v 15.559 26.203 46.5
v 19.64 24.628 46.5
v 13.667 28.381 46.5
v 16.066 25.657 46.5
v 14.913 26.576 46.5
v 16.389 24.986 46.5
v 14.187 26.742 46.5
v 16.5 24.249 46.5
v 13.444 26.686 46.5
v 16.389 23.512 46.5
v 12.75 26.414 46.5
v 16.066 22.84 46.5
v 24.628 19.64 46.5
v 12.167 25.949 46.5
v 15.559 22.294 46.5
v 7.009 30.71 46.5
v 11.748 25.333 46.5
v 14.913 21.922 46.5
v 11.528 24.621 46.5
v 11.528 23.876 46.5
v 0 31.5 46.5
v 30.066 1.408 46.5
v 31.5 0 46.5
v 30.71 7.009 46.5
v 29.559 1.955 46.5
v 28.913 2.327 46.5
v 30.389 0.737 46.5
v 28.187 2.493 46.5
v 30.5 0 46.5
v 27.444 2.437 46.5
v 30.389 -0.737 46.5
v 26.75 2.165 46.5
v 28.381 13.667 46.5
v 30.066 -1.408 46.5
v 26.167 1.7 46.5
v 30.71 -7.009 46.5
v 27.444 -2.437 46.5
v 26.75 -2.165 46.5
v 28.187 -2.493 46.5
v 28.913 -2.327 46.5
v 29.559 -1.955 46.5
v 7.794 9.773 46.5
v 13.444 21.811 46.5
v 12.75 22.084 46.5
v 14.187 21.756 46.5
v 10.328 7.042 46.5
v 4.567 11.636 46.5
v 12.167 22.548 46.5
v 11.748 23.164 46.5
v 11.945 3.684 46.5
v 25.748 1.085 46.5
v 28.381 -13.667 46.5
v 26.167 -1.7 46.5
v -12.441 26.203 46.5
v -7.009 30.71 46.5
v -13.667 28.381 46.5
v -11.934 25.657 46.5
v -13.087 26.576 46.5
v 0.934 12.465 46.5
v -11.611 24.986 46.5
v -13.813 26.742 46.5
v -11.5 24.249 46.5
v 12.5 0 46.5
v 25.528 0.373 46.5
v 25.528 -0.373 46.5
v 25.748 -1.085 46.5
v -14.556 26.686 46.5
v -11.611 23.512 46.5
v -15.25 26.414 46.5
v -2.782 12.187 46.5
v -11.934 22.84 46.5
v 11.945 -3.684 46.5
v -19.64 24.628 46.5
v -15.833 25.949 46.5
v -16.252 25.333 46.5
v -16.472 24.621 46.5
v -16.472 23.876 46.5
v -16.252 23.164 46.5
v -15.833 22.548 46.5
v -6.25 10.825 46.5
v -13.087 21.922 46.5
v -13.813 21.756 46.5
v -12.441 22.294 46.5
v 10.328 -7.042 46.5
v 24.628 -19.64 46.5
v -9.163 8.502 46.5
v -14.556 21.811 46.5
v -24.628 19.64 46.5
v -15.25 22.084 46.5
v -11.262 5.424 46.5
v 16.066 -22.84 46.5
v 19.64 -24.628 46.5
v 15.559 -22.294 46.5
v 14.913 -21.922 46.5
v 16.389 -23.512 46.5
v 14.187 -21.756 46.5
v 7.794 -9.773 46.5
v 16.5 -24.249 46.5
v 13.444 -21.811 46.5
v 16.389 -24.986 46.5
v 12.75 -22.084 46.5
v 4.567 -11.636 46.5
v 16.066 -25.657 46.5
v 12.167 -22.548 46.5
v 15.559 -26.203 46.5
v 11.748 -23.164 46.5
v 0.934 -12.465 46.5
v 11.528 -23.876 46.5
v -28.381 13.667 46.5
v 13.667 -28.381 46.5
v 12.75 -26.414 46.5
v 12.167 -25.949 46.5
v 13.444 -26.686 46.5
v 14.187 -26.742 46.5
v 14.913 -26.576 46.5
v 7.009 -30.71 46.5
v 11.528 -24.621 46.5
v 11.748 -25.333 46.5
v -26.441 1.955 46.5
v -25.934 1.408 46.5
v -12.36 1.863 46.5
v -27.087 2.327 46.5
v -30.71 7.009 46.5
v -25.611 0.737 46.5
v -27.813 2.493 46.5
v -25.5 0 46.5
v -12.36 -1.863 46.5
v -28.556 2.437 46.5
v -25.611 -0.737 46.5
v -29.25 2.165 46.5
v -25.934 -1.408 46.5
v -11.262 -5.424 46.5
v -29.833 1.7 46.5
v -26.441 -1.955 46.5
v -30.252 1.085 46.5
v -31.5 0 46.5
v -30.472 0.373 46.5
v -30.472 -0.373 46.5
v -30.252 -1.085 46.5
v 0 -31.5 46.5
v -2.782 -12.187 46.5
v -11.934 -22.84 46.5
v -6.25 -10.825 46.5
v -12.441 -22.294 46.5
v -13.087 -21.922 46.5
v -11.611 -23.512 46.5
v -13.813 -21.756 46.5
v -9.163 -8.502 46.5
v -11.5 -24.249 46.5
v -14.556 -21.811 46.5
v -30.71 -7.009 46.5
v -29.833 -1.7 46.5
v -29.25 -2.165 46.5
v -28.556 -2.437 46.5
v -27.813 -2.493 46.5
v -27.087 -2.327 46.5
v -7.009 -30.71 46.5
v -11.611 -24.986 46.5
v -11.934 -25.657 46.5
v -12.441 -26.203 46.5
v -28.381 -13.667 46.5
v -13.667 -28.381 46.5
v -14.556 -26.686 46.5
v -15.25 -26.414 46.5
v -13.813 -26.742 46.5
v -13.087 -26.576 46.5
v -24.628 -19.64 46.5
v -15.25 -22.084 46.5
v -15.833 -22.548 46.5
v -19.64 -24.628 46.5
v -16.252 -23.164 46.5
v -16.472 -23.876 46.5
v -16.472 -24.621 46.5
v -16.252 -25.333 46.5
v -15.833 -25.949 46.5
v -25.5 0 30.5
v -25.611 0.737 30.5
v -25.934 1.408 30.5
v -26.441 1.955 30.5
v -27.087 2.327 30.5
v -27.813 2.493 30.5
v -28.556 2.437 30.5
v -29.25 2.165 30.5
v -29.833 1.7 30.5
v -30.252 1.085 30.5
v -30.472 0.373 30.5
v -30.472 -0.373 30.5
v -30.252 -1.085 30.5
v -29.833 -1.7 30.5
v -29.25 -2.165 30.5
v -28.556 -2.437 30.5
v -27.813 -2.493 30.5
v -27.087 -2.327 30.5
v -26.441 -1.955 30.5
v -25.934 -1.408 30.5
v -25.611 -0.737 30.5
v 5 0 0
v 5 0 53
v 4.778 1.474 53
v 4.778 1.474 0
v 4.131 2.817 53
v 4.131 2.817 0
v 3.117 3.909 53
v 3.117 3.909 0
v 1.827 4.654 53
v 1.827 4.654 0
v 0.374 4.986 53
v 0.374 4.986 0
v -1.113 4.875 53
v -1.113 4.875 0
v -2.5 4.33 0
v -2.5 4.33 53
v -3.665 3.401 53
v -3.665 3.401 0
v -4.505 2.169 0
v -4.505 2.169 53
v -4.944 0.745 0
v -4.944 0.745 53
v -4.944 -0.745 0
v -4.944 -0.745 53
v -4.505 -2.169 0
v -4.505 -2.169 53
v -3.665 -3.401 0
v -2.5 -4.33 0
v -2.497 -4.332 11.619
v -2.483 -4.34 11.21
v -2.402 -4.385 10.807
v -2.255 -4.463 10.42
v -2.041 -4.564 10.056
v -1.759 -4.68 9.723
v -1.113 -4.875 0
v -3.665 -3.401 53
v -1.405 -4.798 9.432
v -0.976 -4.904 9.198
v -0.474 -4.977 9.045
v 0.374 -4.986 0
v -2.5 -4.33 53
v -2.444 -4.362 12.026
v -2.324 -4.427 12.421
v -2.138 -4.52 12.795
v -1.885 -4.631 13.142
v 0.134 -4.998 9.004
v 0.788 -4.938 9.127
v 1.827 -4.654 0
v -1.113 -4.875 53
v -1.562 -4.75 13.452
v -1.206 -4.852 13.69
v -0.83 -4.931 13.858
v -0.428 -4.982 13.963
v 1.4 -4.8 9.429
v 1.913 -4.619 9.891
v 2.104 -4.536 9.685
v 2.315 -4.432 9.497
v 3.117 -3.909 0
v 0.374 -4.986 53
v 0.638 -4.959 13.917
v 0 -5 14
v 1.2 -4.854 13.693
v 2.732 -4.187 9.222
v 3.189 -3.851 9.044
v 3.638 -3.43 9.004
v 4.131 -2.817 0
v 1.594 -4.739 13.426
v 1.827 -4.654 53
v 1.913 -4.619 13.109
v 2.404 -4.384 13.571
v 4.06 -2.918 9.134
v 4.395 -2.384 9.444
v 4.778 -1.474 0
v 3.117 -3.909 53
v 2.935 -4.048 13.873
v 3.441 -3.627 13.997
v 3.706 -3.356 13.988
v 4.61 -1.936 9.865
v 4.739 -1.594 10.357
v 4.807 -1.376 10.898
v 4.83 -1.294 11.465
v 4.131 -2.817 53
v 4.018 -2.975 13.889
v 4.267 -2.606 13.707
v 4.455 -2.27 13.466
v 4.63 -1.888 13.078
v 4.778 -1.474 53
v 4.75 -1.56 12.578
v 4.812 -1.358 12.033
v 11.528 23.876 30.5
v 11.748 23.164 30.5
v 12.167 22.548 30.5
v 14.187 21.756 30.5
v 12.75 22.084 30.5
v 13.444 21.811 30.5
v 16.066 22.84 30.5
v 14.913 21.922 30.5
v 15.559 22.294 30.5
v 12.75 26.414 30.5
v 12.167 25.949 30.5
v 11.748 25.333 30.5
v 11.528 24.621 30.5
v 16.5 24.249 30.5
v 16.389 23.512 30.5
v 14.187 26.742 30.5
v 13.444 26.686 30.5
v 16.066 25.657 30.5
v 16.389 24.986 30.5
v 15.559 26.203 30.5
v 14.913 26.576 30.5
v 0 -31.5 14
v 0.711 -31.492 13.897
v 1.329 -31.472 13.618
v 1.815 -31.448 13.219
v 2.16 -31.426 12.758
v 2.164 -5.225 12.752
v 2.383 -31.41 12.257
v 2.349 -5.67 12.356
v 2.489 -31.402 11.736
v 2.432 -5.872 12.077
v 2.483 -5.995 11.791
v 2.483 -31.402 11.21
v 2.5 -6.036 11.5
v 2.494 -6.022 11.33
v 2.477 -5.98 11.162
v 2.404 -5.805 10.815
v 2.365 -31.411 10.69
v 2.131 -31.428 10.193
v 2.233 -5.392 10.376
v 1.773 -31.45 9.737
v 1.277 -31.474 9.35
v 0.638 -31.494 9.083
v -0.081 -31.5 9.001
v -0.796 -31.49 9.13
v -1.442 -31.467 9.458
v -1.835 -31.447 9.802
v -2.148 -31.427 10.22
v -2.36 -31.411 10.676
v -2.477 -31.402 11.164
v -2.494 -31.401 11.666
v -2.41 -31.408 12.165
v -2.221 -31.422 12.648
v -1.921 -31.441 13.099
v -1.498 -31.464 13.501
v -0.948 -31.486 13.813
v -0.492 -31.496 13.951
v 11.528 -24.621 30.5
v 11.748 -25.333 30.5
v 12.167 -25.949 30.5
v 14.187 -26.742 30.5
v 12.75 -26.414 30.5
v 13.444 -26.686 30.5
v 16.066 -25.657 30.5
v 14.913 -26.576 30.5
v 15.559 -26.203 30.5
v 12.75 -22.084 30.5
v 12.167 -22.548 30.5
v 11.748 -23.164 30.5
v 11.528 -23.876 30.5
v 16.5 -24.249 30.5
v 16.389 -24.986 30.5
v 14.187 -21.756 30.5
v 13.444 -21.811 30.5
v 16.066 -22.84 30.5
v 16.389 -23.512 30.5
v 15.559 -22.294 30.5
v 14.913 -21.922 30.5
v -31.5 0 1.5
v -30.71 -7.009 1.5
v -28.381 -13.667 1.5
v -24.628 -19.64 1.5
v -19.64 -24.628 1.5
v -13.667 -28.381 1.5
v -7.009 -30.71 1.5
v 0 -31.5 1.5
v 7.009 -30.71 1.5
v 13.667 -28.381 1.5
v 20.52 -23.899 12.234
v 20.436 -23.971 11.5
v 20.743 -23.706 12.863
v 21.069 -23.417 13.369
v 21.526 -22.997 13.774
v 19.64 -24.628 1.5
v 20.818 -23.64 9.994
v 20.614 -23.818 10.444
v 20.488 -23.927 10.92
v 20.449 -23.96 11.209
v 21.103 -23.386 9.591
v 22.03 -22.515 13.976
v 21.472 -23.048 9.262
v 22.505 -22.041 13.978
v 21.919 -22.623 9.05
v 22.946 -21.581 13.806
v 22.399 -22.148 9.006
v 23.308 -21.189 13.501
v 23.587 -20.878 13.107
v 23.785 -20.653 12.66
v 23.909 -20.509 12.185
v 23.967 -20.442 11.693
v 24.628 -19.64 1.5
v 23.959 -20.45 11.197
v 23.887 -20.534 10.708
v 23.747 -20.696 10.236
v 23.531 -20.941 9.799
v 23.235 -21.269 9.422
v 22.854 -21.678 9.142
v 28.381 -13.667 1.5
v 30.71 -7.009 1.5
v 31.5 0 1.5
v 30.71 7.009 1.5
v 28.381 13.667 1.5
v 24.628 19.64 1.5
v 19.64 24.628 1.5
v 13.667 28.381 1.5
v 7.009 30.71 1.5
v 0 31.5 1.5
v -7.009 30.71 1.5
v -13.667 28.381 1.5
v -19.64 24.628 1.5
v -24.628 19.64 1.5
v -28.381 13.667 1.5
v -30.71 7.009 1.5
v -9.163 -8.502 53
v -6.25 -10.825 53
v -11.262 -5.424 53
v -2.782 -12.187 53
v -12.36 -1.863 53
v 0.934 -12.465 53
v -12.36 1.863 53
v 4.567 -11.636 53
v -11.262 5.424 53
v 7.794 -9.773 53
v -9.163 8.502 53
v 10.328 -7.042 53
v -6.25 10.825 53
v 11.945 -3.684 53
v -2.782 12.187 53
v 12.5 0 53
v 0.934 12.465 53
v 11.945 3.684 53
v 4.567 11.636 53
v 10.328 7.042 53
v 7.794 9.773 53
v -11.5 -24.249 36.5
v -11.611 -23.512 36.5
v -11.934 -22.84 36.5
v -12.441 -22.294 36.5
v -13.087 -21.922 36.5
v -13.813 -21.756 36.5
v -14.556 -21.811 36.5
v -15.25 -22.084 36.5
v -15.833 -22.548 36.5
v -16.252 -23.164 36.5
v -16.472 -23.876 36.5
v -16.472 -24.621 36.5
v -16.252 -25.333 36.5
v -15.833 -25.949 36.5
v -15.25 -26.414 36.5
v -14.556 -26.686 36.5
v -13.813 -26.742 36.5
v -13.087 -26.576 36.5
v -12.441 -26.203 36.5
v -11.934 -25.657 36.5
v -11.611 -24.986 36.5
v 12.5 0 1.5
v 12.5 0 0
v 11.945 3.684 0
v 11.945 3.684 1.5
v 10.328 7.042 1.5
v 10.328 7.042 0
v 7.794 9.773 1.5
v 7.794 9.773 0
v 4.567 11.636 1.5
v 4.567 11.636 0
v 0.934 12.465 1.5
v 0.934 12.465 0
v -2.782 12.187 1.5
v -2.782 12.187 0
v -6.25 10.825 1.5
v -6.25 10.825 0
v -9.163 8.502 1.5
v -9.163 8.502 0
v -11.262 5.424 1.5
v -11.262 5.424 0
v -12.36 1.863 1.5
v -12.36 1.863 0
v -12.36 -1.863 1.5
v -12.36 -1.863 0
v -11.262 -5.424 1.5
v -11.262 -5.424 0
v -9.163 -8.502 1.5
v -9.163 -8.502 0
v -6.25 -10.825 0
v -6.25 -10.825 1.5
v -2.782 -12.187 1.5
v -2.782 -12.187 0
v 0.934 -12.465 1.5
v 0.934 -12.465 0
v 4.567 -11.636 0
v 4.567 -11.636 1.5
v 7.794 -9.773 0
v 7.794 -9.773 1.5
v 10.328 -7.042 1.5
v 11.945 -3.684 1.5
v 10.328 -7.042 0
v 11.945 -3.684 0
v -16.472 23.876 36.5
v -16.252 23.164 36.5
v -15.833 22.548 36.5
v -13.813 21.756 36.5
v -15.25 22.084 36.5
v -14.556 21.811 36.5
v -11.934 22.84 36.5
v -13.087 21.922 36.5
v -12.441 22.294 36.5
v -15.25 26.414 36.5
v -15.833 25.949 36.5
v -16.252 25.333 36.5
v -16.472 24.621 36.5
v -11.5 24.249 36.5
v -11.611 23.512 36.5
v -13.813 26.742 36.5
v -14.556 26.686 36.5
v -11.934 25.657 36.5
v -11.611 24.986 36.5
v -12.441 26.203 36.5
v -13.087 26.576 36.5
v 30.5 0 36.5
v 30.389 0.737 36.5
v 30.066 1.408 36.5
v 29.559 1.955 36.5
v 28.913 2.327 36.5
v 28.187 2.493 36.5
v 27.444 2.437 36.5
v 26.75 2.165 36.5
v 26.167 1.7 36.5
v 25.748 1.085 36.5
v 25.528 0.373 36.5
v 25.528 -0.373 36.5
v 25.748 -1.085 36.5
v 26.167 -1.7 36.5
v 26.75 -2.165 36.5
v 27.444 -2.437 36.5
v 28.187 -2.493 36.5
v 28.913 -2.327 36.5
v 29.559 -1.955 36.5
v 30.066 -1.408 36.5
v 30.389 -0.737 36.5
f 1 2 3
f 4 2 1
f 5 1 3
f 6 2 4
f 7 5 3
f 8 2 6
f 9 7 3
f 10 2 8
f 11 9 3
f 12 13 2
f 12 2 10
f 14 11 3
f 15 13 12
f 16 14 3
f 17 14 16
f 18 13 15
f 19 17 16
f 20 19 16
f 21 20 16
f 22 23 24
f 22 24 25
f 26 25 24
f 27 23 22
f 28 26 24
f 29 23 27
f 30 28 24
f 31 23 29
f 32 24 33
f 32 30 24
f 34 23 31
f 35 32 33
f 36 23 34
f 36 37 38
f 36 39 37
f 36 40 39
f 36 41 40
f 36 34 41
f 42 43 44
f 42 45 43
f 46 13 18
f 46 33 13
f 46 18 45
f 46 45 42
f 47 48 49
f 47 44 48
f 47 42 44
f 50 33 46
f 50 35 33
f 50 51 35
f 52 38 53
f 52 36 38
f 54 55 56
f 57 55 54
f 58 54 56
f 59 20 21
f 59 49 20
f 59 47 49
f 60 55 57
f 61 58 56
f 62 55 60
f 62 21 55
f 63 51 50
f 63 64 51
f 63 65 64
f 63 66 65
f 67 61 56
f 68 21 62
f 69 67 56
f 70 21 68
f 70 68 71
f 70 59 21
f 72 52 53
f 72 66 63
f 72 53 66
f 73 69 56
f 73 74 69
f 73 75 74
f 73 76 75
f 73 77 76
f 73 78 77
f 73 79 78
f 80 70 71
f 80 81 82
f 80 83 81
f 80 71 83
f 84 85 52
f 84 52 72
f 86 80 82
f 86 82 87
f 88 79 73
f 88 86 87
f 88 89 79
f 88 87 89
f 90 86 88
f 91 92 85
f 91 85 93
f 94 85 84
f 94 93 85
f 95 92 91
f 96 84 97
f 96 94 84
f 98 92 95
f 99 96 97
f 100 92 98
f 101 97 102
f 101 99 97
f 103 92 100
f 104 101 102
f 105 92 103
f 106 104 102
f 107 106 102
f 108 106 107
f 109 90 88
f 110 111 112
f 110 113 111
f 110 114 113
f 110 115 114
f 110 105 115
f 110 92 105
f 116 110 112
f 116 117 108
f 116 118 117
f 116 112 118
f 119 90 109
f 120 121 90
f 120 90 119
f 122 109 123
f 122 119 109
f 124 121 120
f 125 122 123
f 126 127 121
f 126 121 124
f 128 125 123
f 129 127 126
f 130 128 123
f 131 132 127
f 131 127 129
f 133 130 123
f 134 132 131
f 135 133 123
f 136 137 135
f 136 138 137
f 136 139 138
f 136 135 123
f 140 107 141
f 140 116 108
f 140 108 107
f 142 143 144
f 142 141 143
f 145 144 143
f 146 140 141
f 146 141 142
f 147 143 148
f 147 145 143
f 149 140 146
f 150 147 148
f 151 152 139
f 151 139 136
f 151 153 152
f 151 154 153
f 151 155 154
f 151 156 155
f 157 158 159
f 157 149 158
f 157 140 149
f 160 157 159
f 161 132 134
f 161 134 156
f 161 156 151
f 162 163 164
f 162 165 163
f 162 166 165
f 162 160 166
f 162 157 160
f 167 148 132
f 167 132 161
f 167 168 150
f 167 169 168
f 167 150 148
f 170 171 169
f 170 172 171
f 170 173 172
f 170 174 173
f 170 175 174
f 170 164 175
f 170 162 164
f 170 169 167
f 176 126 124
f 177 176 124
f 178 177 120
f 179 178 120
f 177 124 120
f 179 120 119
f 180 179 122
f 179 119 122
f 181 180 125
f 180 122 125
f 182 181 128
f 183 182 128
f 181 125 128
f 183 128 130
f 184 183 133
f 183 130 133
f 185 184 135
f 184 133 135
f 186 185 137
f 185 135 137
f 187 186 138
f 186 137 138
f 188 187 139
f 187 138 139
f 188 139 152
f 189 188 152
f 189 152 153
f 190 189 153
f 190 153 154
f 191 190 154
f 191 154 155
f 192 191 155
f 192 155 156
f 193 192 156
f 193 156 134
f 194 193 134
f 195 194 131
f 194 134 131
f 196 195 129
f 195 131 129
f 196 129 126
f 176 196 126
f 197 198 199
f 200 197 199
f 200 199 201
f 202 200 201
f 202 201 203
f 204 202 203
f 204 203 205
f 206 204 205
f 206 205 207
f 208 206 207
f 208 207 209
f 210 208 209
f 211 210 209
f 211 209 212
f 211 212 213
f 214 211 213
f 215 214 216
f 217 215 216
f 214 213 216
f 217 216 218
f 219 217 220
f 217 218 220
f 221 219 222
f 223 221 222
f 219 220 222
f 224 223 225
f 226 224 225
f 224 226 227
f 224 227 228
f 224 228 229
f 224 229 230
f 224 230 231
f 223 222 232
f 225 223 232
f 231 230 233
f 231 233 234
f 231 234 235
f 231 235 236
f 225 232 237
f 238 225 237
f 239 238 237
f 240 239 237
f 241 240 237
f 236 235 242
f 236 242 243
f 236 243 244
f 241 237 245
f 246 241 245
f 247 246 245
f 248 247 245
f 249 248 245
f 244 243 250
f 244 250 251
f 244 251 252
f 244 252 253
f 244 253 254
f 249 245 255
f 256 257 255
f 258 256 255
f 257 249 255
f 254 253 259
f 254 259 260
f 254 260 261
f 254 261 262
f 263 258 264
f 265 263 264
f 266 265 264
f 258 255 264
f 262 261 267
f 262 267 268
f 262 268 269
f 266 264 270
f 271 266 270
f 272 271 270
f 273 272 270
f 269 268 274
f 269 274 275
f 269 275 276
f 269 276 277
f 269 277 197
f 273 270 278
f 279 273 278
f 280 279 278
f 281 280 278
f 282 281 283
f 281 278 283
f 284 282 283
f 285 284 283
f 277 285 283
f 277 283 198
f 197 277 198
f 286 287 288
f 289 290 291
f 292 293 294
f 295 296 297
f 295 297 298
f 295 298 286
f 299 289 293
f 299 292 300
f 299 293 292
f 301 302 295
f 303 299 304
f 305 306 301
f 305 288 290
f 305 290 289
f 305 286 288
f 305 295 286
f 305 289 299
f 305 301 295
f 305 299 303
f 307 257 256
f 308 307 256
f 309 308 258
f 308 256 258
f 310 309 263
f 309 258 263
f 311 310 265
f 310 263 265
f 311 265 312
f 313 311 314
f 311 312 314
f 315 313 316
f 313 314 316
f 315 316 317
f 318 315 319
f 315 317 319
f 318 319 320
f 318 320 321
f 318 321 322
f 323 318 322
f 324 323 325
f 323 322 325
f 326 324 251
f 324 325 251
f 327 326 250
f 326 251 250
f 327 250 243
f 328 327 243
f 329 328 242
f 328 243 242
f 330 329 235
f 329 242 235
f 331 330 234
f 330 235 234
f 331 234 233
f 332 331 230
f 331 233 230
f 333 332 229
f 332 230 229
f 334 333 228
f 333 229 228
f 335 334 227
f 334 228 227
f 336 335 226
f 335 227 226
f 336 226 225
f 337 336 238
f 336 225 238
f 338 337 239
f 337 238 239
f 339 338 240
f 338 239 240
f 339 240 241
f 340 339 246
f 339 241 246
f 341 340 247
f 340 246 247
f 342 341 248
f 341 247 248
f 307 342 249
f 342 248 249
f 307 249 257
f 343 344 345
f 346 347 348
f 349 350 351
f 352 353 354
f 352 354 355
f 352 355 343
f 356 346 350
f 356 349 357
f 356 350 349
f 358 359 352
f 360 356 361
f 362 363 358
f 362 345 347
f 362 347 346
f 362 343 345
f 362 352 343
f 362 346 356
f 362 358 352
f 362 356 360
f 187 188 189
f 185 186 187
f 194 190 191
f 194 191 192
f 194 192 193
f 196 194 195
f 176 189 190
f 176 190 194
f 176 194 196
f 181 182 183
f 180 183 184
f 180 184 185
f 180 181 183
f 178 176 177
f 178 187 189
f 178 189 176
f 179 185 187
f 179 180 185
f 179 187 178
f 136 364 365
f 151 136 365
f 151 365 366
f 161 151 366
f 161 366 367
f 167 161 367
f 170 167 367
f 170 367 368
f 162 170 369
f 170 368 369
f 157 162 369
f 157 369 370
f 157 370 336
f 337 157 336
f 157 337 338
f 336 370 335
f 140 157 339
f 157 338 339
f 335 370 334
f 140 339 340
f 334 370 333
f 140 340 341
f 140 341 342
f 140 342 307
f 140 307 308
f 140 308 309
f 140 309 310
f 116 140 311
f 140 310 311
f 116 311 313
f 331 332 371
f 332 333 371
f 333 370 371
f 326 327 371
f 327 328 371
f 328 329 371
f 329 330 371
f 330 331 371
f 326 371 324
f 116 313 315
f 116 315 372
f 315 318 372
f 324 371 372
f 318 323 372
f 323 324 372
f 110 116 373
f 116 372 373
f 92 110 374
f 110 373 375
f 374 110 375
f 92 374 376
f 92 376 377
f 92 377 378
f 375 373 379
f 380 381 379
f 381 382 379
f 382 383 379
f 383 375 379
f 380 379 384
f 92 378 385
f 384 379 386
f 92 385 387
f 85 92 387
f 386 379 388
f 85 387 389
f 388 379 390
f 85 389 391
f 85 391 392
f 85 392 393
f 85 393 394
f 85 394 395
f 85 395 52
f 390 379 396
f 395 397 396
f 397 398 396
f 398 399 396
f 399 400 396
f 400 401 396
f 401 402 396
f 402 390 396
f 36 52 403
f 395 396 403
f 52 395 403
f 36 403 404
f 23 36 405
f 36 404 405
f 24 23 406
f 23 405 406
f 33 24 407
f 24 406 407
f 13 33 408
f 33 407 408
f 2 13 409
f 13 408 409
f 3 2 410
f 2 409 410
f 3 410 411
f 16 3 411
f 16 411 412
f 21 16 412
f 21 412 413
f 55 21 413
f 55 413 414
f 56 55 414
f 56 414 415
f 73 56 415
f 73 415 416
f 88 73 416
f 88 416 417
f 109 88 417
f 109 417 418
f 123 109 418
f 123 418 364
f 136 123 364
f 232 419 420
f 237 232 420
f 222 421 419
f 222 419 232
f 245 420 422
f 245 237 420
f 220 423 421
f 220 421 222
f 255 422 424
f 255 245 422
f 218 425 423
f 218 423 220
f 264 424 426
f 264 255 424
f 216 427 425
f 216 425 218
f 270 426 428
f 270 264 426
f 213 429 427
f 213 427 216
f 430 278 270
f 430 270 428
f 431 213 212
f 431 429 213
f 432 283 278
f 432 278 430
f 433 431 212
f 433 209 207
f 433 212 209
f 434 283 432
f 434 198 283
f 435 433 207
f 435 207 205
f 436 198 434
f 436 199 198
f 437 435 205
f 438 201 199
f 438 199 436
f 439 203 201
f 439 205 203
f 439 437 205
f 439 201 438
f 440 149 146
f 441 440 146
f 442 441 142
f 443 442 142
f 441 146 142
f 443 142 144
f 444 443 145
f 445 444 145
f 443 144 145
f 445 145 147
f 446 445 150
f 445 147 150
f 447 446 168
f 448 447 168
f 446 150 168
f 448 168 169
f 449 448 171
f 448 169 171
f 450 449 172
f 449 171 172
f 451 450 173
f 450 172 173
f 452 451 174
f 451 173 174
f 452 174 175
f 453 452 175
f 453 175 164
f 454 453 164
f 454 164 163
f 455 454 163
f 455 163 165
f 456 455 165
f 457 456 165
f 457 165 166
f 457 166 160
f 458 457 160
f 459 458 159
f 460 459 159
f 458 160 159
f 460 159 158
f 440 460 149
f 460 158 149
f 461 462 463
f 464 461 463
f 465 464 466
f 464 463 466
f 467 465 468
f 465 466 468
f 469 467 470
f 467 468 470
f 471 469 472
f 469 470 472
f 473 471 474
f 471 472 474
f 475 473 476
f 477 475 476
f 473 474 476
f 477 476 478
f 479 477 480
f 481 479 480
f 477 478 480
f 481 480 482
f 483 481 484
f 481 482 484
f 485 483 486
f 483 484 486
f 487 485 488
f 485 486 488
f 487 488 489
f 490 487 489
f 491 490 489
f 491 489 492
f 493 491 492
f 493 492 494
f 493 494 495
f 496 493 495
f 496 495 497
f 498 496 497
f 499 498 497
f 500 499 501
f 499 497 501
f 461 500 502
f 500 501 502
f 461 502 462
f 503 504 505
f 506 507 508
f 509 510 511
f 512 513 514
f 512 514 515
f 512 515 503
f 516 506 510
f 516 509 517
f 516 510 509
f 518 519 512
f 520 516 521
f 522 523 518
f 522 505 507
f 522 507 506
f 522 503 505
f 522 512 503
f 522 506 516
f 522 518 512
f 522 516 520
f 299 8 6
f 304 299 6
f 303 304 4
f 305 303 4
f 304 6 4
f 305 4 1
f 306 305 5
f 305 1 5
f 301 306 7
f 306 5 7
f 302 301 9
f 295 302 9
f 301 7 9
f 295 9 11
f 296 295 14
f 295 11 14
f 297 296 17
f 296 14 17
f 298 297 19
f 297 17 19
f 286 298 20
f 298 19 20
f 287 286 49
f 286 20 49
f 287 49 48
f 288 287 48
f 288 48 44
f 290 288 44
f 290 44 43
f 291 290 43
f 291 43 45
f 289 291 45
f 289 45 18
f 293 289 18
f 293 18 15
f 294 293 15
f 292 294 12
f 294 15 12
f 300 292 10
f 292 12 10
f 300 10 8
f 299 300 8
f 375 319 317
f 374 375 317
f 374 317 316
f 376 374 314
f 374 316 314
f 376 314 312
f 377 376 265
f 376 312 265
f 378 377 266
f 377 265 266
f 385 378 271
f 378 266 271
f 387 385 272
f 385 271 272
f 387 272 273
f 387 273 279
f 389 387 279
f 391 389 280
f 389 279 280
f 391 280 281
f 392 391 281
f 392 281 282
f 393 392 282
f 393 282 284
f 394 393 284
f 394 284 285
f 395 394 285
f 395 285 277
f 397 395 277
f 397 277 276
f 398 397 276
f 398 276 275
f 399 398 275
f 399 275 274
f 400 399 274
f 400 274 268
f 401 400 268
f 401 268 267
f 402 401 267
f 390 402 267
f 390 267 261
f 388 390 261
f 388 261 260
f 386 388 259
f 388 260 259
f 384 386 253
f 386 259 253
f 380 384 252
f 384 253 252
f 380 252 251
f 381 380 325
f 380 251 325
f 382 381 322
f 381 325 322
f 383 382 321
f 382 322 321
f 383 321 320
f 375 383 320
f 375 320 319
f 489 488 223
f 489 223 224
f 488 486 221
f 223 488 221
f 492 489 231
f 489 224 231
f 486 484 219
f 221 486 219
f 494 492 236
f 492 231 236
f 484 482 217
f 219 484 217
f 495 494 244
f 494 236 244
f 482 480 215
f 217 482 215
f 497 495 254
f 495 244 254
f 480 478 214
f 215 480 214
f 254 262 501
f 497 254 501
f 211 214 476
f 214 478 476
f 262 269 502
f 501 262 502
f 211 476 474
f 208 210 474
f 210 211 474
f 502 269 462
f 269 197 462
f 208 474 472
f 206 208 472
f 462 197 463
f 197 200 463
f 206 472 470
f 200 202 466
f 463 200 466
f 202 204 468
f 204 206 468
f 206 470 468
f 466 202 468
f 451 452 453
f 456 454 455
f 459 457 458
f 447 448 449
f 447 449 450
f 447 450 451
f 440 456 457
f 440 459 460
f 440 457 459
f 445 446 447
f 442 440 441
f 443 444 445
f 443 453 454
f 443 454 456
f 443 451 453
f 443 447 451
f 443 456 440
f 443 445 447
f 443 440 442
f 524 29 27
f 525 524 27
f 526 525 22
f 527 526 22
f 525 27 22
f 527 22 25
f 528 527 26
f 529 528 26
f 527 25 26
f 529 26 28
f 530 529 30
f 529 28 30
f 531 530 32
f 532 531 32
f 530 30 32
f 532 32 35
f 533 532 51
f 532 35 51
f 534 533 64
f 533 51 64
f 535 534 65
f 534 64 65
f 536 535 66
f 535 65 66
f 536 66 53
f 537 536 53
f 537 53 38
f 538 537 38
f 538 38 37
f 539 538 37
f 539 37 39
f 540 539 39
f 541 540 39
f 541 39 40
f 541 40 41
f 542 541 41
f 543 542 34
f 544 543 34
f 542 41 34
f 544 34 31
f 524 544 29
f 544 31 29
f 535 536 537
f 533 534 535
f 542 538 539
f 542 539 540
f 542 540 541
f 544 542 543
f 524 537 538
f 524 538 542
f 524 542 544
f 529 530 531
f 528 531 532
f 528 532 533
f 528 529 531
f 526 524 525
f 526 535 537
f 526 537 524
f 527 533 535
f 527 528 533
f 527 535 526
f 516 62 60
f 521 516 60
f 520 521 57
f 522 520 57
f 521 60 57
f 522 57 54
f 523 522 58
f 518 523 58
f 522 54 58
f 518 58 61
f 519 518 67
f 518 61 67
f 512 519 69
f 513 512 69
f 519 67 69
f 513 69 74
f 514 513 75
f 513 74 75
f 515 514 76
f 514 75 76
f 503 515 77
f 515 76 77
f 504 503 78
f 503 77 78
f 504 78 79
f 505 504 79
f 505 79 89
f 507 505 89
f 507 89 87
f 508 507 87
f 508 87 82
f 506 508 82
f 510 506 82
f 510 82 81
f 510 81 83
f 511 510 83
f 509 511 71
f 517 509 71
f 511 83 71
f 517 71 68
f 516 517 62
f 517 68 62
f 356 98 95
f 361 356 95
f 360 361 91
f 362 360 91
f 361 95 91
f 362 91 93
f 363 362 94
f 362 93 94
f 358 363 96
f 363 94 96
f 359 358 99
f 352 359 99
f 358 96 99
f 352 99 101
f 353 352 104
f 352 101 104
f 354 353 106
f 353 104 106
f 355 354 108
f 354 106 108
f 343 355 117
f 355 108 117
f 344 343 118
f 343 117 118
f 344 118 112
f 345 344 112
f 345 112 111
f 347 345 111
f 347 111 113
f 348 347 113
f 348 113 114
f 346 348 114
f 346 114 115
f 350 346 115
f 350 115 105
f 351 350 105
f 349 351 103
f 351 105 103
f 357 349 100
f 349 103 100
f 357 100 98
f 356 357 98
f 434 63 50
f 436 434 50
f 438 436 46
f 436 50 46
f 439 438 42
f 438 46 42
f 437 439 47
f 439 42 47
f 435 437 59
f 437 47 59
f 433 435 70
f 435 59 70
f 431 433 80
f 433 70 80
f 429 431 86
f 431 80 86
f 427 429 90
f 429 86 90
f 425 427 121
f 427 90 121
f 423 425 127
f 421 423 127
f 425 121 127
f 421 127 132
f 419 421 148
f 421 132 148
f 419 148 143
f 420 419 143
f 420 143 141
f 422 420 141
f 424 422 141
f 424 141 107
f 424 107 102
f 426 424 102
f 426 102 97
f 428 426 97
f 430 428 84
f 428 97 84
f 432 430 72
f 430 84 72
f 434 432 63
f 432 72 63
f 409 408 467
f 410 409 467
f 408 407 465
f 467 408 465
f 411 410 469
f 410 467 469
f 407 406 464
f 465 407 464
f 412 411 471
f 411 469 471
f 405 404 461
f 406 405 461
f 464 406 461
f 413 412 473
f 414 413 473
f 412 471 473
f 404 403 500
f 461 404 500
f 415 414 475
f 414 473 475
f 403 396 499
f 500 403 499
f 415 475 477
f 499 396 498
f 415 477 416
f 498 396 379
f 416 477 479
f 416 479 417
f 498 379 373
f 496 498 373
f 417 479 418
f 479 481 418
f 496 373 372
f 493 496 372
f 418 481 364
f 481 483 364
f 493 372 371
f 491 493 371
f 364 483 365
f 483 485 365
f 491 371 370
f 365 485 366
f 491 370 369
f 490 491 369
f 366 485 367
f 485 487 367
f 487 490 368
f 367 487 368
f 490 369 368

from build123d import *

# Parameters (mm, degrees)
SKETCH_2_R          = 12.5
EXTRUDE_1_DEPTH     = 1.5
SKETCH_3_R          = 31.5
EXTRUDE_2_DEPTH     = 45
SKETCH_4_R          = 12.5
EXTRUDE_3_DEPTH     = 6.5
SKETCH_5_R          = 5
CUT_EXTRUDE_1_DEPTH = 70.235106702
SKETCH_6_R          = 2.5
CUT_EXTRUDE_2_DEPTH = 70.235106702
SKETCH_7_R          = 2.5
CUT_EXTRUDE_3_DEPTH = 70.235106869
SKETCH_8_R          = 2.5
CUT_EXTRUDE_4_DEPTH = 10
SKETCH_9_R          = 2.5
CUT_EXTRUDE_5_DEPTH = 16


with BuildPart() as part:
    # 草图2 → 凸台-拉伸1 (new body)
    with BuildSketch(Plane.XY):
        Circle(SKETCH_2_R)
    extrude(amount=EXTRUDE_1_DEPTH)

    # 草图3 → 凸台-拉伸2 (add)
    with BuildSketch(Plane.XY.offset(1.5)):
        with Locations(Location((0, 0, 0), (0, 0, 180))):
            Circle(SKETCH_3_R)
    extrude(amount=EXTRUDE_2_DEPTH)

    # 草图4 → 凸台-拉伸3 (add)
    with BuildSketch(Plane.XY.offset(46.5)):
        Circle(SKETCH_4_R)
    extrude(amount=EXTRUDE_3_DEPTH)

    # 草图5 → 切除-拉伸1 (cut, through all)
    with BuildSketch(Plane.XY.offset(53)):
        Circle(SKETCH_5_R)
    extrude(amount=-CUT_EXTRUDE_1_DEPTH, mode=Mode.SUBTRACT)

    # 草图6 → 切除-拉伸2 (cut, through all)
    with BuildSketch(Plane(origin=(0, 0, 0), x_dir=(0.7071067811865477, 0.7071067811865475, 0), z_dir=(-0.7071067811865475, 0.7071067811865477, 0))):
        with Locations(Location((0, -11.5, 0), (0, 0, 180))):
            Circle(SKETCH_6_R)
    extrude(amount=-CUT_EXTRUDE_2_DEPTH, mode=Mode.SUBTRACT)

    # 草图7 → 切除-拉伸3 (cut, through all)
    with BuildSketch(Plane(origin=(0, 0, 0), x_dir=(1, 0, 0), z_dir=(0, 1, 0))):
        with Locations(Location((0, -11.5, 0), (0, 0, 270))):
            Circle(SKETCH_7_R)
    extrude(amount=-CUT_EXTRUDE_3_DEPTH, mode=Mode.SUBTRACT)

    # 草图8 → 切除-拉伸4 (cut)
    with BuildSketch(Plane.XY.offset(46.5)):
        with Locations((28, 0)):
            Circle(SKETCH_8_R)
        with Locations((-14, -24.248711306)):
            Circle(SKETCH_8_R)
        with Locations((-14, 24.248711306)):
            Circle(SKETCH_8_R)
    extrude(amount=-CUT_EXTRUDE_4_DEPTH, mode=Mode.SUBTRACT)

    # 草图9 → 切除-拉伸5 (cut)
    with BuildSketch(Plane.XY.offset(46.5)):
        with Locations((-28, 0)):
            Circle(SKETCH_9_R)
        with Locations((14, 24.248711306)):
            Circle(SKETCH_9_R)
        with Locations((14, -24.248711306)):
            Circle(SKETCH_9_R)
    extrude(amount=-CUT_EXTRUDE_5_DEPTH, mode=Mode.SUBTRACT)


solid = part.part
